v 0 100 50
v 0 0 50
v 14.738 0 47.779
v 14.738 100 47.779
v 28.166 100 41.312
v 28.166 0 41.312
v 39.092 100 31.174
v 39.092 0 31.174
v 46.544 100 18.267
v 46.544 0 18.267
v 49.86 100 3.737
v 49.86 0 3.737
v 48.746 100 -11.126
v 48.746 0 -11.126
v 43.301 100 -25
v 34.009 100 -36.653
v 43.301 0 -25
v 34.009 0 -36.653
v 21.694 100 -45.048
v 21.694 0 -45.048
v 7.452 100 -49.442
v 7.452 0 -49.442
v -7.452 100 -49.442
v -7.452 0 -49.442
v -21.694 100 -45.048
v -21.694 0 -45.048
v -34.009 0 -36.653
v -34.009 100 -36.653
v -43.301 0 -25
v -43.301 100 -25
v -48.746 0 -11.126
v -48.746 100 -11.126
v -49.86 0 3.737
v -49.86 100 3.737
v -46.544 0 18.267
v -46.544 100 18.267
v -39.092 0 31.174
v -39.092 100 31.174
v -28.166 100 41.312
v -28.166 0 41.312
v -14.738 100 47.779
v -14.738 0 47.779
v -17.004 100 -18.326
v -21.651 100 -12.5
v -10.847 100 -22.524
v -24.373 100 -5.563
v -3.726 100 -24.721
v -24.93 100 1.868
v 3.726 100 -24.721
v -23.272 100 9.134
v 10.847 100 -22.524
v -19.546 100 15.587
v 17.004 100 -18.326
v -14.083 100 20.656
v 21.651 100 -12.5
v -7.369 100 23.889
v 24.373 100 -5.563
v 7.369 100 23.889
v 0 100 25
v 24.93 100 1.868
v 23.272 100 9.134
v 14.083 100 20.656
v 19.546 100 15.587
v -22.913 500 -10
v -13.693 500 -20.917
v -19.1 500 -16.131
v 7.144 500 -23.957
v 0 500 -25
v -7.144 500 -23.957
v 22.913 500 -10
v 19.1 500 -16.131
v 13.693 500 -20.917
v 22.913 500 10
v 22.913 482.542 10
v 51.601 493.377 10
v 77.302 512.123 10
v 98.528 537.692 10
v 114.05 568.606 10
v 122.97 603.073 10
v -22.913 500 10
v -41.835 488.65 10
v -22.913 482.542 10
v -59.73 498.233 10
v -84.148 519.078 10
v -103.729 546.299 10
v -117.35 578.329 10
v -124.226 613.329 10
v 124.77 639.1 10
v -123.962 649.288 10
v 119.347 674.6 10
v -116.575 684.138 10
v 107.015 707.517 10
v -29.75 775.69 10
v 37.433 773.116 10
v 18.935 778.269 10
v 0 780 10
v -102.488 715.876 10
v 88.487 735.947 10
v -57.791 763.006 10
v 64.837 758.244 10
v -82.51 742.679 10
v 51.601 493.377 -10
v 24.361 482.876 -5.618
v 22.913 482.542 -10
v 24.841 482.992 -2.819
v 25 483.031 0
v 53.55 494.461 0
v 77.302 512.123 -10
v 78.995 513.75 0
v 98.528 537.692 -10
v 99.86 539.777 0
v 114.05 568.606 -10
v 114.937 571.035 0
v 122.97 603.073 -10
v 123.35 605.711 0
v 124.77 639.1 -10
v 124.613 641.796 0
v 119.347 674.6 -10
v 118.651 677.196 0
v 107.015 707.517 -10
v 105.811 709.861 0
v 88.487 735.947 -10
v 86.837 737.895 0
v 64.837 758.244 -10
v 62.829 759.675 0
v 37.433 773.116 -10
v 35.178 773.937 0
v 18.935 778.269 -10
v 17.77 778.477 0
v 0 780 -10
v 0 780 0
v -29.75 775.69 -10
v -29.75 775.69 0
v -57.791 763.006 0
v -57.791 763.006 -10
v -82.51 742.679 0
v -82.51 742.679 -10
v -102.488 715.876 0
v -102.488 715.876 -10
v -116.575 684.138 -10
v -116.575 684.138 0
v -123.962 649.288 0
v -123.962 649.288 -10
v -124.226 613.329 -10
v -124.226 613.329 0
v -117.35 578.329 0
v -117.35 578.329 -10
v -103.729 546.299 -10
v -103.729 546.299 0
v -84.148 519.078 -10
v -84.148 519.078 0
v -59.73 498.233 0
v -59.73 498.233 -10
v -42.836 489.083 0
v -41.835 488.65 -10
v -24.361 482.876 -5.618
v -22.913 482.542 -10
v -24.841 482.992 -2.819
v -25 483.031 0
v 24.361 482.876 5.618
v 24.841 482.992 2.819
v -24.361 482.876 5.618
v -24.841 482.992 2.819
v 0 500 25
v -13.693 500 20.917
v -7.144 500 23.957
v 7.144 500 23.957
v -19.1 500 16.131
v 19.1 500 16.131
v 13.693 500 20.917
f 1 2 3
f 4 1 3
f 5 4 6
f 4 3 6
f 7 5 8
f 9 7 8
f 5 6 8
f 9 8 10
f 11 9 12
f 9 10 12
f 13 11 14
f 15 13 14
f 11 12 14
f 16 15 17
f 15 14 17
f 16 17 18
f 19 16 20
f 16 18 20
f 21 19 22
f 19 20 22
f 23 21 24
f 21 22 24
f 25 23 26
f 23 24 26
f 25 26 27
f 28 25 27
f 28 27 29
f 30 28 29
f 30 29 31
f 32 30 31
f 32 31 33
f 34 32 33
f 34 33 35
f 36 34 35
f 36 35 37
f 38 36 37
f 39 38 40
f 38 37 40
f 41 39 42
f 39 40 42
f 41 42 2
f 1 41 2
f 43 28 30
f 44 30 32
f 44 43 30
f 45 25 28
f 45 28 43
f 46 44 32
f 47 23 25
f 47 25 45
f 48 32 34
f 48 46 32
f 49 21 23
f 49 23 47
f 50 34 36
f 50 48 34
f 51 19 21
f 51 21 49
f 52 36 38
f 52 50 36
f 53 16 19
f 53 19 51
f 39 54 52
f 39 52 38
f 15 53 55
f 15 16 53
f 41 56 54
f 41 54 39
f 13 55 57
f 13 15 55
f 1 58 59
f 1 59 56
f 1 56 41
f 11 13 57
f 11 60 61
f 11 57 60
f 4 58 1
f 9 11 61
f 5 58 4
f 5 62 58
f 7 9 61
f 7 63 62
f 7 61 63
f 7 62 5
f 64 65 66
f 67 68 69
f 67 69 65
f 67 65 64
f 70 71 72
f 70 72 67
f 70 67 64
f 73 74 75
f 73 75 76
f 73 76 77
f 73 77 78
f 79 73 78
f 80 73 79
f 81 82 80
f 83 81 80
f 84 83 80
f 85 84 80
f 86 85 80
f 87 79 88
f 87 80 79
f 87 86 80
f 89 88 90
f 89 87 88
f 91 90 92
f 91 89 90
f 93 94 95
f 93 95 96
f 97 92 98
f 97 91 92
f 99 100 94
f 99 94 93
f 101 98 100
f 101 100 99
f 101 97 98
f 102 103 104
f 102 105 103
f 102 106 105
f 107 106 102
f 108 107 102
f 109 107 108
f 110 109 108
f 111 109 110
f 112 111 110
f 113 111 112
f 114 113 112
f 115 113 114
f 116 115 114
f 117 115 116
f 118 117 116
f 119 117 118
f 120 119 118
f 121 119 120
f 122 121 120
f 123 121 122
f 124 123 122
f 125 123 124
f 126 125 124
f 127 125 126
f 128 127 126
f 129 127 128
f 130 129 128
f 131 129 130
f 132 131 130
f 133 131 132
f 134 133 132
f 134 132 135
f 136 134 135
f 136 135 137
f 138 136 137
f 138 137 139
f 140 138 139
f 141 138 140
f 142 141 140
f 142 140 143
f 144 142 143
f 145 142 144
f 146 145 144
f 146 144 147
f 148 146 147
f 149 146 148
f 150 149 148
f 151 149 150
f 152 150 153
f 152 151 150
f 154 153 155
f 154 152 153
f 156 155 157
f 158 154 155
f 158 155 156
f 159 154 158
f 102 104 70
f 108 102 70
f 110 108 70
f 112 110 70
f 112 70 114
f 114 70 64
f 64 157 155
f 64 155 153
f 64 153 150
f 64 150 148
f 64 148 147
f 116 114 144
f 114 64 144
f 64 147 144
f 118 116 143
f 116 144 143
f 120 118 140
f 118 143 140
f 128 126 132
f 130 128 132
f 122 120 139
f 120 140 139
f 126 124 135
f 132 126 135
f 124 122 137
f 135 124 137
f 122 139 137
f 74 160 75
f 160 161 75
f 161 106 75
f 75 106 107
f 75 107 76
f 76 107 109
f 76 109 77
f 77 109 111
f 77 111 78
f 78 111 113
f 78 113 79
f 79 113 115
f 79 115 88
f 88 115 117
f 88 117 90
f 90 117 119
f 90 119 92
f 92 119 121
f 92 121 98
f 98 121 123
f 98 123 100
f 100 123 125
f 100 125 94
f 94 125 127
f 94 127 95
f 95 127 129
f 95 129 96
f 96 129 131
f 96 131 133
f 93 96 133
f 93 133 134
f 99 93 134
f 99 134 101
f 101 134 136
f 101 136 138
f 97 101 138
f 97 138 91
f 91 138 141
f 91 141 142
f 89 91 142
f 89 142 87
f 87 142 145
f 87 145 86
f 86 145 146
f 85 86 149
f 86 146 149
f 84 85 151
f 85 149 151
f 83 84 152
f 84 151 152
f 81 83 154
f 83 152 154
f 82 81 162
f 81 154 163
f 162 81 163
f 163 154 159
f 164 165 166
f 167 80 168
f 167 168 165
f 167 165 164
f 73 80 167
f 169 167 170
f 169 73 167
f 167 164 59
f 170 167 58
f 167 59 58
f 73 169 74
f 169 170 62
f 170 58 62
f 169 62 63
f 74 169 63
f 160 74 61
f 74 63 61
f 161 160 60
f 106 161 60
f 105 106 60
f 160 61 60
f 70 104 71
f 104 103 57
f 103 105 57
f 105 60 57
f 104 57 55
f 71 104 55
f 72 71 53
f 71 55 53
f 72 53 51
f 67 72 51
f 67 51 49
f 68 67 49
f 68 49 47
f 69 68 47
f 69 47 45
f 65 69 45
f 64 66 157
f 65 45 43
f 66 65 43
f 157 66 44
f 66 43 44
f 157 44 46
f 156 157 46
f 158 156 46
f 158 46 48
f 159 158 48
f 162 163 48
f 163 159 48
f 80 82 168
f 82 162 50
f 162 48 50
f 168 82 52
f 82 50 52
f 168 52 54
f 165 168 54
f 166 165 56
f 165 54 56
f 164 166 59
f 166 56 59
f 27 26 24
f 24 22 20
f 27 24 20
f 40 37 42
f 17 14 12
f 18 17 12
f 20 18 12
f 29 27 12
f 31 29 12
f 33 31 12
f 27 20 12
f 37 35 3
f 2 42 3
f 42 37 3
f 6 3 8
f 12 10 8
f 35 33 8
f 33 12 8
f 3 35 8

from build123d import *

# Parameters (mm, degrees)
SKETCH_1_R      = 50
EXTRUDE_1_DEPTH = 100
SKETCH_2_R      = 25
EXTRUDE_2_DEPTH = 400
SKETCH_3_RX     = 150
SKETCH_3_RY     = 125
EXTRUDE_3_DEPTH = 10


with BuildPart() as part:
    # 草图1 → 凸台-拉伸1 (new body)
    with BuildSketch(Plane(origin=(0, 0, 0), x_dir=(1, 0, 0), z_dir=(0, 1, 0))):
        with Locations(Location((0, 0, 0), (0, 0, 270))):
            Circle(SKETCH_1_R)
    extrude(amount=EXTRUDE_1_DEPTH)

    # 草图2 → 凸台-拉伸2 (add)
    with BuildSketch(Plane(origin=(0, 100, 0), x_dir=(1, 0, 0), z_dir=(0, 1, 0))):
        with Locations(Location((0, 0, 0), (0, 0, 270))):
            Circle(SKETCH_2_R)
    extrude(amount=EXTRUDE_2_DEPTH)

    # 草图3 → 凸台-拉伸3 (add, symmetric)
    with BuildSketch(Plane.XY):
        with Locations(Location((0, 630), (0, 0, 90))):
            Ellipse(SKETCH_3_RX, SKETCH_3_RY)
    extrude(amount=EXTRUDE_3_DEPTH, both=True)


solid = part.part
